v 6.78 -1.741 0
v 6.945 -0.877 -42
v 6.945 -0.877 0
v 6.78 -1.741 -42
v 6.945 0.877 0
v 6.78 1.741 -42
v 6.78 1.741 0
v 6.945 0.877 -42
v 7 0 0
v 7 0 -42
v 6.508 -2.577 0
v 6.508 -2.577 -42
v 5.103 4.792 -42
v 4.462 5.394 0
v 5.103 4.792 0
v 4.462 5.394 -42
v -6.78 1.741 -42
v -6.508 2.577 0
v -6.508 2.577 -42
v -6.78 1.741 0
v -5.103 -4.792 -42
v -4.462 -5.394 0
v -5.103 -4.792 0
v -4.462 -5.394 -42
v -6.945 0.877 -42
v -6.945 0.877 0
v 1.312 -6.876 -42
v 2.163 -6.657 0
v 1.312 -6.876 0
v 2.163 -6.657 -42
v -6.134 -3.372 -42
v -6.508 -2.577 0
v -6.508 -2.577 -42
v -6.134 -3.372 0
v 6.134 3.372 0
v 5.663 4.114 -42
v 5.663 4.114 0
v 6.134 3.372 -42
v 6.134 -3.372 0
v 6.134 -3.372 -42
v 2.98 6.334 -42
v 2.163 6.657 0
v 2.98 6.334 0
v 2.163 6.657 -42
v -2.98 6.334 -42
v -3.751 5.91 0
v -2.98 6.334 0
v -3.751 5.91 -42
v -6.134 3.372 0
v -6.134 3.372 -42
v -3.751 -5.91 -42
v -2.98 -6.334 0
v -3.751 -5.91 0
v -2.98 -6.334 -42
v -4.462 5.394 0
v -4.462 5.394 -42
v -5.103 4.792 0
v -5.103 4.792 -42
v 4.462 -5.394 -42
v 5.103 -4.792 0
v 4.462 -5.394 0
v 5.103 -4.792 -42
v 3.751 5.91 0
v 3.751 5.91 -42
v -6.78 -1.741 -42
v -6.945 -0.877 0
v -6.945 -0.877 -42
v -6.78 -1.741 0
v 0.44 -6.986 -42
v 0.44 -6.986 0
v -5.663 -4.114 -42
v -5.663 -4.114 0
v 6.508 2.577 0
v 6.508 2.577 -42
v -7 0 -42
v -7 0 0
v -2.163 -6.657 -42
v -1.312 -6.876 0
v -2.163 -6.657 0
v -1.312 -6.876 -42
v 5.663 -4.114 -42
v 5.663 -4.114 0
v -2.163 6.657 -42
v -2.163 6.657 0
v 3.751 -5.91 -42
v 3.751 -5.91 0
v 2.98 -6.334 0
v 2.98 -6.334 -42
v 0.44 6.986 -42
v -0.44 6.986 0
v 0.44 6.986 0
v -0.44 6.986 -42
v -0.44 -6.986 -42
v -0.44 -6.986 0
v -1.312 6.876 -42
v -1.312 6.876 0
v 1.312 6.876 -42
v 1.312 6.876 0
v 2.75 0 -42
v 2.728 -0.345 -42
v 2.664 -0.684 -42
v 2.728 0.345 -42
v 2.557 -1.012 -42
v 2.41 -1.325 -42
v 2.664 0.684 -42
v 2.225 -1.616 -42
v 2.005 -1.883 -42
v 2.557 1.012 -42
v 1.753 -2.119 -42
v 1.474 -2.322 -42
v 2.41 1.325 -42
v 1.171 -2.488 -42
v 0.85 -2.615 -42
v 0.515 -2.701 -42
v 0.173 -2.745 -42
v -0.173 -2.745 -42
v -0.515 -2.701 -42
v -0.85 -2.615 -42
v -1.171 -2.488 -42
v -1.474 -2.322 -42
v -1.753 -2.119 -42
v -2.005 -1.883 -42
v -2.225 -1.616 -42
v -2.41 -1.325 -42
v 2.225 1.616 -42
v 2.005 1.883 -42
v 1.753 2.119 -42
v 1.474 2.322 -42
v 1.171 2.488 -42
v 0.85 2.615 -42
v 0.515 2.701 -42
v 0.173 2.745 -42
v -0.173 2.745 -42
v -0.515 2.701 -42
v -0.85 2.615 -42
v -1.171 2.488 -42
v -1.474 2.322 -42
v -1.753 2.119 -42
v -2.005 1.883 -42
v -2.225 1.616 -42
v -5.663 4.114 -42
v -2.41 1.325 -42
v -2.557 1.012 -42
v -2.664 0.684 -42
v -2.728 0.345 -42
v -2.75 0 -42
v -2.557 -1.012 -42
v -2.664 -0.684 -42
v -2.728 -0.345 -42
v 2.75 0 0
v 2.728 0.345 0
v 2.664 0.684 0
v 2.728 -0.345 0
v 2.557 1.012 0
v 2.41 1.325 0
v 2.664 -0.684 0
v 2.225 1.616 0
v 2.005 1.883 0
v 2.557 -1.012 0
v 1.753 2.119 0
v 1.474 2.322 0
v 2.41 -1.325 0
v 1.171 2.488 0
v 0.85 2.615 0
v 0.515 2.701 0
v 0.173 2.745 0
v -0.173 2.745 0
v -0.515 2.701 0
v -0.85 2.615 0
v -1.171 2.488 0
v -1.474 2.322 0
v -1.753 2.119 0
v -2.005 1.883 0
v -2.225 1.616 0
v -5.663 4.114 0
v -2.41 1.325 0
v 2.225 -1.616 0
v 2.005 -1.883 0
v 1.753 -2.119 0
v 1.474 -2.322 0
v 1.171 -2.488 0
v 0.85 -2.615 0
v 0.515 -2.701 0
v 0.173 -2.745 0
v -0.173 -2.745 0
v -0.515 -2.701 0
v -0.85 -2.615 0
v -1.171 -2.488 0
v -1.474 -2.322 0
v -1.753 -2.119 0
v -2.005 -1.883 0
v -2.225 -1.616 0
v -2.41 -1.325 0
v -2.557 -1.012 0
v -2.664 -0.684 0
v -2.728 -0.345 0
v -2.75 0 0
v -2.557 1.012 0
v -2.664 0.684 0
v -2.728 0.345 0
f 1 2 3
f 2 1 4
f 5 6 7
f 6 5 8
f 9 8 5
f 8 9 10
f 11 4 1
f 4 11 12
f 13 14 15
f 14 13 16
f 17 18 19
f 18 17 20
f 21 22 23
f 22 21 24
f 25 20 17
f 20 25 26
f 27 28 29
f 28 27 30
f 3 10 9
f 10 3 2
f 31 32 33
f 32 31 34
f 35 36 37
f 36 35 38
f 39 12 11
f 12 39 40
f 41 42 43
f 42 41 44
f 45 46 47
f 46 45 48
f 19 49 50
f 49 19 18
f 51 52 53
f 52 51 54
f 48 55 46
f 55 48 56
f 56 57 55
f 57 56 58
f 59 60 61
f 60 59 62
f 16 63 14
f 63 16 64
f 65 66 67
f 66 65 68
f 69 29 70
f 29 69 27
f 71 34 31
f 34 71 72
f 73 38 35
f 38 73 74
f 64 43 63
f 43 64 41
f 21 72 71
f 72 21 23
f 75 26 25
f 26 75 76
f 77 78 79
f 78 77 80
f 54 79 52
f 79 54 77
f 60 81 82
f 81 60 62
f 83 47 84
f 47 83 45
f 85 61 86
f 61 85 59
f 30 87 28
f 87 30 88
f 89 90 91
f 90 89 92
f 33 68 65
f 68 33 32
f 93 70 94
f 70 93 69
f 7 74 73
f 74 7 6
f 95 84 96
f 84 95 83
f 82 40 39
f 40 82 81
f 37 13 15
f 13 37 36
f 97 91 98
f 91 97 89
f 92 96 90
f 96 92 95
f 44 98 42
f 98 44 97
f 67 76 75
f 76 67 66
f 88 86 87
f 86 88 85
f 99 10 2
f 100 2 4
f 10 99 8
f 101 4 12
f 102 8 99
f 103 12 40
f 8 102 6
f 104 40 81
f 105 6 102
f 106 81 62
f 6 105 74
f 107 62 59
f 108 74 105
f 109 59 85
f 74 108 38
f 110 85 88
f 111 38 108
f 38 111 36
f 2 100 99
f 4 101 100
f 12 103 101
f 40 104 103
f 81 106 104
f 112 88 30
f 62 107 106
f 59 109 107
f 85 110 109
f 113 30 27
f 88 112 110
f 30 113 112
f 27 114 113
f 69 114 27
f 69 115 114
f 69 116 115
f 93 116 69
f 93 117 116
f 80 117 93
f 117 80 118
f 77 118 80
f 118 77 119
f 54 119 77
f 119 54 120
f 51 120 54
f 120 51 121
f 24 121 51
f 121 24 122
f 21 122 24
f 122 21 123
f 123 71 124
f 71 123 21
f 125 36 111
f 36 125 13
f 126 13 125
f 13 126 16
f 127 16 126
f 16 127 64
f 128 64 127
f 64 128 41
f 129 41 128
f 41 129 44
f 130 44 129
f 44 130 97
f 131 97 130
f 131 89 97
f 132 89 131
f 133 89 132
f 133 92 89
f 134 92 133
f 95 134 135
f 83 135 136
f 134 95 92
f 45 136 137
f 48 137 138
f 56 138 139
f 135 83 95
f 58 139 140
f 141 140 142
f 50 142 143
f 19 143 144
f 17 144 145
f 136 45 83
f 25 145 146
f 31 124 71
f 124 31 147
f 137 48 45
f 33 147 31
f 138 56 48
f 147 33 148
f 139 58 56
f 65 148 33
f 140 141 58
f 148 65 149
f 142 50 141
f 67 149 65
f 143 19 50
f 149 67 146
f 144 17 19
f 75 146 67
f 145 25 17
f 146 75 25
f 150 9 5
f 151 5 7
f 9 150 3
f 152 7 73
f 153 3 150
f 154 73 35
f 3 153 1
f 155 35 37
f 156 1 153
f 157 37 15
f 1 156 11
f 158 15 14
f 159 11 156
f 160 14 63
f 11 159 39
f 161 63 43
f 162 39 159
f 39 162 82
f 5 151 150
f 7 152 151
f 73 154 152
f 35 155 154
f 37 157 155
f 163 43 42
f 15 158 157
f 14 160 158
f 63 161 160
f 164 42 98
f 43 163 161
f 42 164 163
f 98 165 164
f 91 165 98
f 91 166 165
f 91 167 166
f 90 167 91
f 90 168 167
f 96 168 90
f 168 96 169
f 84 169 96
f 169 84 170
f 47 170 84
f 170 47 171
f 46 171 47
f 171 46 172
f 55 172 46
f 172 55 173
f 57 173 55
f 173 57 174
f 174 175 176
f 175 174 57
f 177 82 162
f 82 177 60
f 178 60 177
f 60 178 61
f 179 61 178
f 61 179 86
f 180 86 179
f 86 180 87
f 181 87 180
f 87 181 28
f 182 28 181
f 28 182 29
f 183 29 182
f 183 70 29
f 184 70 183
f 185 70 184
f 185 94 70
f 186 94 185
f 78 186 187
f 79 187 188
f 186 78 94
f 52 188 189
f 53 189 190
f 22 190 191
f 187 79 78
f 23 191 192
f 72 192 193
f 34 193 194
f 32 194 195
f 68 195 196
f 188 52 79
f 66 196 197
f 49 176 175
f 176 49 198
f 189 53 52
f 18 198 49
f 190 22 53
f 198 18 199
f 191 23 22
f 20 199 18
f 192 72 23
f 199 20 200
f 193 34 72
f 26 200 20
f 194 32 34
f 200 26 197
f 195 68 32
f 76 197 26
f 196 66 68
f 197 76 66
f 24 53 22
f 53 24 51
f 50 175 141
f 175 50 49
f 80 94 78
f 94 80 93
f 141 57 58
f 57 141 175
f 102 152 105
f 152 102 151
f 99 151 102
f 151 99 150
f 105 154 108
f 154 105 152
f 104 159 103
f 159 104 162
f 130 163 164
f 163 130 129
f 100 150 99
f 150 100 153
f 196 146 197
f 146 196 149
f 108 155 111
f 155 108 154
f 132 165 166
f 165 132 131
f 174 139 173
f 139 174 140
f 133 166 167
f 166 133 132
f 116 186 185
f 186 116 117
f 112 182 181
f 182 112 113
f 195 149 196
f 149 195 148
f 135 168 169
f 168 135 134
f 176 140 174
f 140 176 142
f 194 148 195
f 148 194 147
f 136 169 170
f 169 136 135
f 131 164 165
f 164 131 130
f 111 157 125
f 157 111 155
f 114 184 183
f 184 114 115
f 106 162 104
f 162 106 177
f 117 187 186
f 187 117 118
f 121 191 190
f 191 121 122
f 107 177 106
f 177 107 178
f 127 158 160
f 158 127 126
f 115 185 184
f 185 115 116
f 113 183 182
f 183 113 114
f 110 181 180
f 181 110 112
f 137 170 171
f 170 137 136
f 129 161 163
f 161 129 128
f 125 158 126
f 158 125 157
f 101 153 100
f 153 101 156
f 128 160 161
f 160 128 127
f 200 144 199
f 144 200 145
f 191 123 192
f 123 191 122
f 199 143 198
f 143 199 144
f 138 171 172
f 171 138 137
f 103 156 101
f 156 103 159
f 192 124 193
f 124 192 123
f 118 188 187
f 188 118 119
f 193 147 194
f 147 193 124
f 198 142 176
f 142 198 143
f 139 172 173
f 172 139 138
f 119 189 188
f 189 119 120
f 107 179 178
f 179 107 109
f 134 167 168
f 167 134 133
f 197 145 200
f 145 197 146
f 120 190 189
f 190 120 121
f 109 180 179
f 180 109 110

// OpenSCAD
$fn = 50;


difference() {
	union() {
		translate(v = [0, 0, -42.0000000000]) {
			cylinder(h = 42, r = 7.0000000000);
		}
	}
	union() {
		#translate(v = [0, 0, -42]) {
			cylinder(h = 42, r = 2.7500000000);
		}
	}
}
